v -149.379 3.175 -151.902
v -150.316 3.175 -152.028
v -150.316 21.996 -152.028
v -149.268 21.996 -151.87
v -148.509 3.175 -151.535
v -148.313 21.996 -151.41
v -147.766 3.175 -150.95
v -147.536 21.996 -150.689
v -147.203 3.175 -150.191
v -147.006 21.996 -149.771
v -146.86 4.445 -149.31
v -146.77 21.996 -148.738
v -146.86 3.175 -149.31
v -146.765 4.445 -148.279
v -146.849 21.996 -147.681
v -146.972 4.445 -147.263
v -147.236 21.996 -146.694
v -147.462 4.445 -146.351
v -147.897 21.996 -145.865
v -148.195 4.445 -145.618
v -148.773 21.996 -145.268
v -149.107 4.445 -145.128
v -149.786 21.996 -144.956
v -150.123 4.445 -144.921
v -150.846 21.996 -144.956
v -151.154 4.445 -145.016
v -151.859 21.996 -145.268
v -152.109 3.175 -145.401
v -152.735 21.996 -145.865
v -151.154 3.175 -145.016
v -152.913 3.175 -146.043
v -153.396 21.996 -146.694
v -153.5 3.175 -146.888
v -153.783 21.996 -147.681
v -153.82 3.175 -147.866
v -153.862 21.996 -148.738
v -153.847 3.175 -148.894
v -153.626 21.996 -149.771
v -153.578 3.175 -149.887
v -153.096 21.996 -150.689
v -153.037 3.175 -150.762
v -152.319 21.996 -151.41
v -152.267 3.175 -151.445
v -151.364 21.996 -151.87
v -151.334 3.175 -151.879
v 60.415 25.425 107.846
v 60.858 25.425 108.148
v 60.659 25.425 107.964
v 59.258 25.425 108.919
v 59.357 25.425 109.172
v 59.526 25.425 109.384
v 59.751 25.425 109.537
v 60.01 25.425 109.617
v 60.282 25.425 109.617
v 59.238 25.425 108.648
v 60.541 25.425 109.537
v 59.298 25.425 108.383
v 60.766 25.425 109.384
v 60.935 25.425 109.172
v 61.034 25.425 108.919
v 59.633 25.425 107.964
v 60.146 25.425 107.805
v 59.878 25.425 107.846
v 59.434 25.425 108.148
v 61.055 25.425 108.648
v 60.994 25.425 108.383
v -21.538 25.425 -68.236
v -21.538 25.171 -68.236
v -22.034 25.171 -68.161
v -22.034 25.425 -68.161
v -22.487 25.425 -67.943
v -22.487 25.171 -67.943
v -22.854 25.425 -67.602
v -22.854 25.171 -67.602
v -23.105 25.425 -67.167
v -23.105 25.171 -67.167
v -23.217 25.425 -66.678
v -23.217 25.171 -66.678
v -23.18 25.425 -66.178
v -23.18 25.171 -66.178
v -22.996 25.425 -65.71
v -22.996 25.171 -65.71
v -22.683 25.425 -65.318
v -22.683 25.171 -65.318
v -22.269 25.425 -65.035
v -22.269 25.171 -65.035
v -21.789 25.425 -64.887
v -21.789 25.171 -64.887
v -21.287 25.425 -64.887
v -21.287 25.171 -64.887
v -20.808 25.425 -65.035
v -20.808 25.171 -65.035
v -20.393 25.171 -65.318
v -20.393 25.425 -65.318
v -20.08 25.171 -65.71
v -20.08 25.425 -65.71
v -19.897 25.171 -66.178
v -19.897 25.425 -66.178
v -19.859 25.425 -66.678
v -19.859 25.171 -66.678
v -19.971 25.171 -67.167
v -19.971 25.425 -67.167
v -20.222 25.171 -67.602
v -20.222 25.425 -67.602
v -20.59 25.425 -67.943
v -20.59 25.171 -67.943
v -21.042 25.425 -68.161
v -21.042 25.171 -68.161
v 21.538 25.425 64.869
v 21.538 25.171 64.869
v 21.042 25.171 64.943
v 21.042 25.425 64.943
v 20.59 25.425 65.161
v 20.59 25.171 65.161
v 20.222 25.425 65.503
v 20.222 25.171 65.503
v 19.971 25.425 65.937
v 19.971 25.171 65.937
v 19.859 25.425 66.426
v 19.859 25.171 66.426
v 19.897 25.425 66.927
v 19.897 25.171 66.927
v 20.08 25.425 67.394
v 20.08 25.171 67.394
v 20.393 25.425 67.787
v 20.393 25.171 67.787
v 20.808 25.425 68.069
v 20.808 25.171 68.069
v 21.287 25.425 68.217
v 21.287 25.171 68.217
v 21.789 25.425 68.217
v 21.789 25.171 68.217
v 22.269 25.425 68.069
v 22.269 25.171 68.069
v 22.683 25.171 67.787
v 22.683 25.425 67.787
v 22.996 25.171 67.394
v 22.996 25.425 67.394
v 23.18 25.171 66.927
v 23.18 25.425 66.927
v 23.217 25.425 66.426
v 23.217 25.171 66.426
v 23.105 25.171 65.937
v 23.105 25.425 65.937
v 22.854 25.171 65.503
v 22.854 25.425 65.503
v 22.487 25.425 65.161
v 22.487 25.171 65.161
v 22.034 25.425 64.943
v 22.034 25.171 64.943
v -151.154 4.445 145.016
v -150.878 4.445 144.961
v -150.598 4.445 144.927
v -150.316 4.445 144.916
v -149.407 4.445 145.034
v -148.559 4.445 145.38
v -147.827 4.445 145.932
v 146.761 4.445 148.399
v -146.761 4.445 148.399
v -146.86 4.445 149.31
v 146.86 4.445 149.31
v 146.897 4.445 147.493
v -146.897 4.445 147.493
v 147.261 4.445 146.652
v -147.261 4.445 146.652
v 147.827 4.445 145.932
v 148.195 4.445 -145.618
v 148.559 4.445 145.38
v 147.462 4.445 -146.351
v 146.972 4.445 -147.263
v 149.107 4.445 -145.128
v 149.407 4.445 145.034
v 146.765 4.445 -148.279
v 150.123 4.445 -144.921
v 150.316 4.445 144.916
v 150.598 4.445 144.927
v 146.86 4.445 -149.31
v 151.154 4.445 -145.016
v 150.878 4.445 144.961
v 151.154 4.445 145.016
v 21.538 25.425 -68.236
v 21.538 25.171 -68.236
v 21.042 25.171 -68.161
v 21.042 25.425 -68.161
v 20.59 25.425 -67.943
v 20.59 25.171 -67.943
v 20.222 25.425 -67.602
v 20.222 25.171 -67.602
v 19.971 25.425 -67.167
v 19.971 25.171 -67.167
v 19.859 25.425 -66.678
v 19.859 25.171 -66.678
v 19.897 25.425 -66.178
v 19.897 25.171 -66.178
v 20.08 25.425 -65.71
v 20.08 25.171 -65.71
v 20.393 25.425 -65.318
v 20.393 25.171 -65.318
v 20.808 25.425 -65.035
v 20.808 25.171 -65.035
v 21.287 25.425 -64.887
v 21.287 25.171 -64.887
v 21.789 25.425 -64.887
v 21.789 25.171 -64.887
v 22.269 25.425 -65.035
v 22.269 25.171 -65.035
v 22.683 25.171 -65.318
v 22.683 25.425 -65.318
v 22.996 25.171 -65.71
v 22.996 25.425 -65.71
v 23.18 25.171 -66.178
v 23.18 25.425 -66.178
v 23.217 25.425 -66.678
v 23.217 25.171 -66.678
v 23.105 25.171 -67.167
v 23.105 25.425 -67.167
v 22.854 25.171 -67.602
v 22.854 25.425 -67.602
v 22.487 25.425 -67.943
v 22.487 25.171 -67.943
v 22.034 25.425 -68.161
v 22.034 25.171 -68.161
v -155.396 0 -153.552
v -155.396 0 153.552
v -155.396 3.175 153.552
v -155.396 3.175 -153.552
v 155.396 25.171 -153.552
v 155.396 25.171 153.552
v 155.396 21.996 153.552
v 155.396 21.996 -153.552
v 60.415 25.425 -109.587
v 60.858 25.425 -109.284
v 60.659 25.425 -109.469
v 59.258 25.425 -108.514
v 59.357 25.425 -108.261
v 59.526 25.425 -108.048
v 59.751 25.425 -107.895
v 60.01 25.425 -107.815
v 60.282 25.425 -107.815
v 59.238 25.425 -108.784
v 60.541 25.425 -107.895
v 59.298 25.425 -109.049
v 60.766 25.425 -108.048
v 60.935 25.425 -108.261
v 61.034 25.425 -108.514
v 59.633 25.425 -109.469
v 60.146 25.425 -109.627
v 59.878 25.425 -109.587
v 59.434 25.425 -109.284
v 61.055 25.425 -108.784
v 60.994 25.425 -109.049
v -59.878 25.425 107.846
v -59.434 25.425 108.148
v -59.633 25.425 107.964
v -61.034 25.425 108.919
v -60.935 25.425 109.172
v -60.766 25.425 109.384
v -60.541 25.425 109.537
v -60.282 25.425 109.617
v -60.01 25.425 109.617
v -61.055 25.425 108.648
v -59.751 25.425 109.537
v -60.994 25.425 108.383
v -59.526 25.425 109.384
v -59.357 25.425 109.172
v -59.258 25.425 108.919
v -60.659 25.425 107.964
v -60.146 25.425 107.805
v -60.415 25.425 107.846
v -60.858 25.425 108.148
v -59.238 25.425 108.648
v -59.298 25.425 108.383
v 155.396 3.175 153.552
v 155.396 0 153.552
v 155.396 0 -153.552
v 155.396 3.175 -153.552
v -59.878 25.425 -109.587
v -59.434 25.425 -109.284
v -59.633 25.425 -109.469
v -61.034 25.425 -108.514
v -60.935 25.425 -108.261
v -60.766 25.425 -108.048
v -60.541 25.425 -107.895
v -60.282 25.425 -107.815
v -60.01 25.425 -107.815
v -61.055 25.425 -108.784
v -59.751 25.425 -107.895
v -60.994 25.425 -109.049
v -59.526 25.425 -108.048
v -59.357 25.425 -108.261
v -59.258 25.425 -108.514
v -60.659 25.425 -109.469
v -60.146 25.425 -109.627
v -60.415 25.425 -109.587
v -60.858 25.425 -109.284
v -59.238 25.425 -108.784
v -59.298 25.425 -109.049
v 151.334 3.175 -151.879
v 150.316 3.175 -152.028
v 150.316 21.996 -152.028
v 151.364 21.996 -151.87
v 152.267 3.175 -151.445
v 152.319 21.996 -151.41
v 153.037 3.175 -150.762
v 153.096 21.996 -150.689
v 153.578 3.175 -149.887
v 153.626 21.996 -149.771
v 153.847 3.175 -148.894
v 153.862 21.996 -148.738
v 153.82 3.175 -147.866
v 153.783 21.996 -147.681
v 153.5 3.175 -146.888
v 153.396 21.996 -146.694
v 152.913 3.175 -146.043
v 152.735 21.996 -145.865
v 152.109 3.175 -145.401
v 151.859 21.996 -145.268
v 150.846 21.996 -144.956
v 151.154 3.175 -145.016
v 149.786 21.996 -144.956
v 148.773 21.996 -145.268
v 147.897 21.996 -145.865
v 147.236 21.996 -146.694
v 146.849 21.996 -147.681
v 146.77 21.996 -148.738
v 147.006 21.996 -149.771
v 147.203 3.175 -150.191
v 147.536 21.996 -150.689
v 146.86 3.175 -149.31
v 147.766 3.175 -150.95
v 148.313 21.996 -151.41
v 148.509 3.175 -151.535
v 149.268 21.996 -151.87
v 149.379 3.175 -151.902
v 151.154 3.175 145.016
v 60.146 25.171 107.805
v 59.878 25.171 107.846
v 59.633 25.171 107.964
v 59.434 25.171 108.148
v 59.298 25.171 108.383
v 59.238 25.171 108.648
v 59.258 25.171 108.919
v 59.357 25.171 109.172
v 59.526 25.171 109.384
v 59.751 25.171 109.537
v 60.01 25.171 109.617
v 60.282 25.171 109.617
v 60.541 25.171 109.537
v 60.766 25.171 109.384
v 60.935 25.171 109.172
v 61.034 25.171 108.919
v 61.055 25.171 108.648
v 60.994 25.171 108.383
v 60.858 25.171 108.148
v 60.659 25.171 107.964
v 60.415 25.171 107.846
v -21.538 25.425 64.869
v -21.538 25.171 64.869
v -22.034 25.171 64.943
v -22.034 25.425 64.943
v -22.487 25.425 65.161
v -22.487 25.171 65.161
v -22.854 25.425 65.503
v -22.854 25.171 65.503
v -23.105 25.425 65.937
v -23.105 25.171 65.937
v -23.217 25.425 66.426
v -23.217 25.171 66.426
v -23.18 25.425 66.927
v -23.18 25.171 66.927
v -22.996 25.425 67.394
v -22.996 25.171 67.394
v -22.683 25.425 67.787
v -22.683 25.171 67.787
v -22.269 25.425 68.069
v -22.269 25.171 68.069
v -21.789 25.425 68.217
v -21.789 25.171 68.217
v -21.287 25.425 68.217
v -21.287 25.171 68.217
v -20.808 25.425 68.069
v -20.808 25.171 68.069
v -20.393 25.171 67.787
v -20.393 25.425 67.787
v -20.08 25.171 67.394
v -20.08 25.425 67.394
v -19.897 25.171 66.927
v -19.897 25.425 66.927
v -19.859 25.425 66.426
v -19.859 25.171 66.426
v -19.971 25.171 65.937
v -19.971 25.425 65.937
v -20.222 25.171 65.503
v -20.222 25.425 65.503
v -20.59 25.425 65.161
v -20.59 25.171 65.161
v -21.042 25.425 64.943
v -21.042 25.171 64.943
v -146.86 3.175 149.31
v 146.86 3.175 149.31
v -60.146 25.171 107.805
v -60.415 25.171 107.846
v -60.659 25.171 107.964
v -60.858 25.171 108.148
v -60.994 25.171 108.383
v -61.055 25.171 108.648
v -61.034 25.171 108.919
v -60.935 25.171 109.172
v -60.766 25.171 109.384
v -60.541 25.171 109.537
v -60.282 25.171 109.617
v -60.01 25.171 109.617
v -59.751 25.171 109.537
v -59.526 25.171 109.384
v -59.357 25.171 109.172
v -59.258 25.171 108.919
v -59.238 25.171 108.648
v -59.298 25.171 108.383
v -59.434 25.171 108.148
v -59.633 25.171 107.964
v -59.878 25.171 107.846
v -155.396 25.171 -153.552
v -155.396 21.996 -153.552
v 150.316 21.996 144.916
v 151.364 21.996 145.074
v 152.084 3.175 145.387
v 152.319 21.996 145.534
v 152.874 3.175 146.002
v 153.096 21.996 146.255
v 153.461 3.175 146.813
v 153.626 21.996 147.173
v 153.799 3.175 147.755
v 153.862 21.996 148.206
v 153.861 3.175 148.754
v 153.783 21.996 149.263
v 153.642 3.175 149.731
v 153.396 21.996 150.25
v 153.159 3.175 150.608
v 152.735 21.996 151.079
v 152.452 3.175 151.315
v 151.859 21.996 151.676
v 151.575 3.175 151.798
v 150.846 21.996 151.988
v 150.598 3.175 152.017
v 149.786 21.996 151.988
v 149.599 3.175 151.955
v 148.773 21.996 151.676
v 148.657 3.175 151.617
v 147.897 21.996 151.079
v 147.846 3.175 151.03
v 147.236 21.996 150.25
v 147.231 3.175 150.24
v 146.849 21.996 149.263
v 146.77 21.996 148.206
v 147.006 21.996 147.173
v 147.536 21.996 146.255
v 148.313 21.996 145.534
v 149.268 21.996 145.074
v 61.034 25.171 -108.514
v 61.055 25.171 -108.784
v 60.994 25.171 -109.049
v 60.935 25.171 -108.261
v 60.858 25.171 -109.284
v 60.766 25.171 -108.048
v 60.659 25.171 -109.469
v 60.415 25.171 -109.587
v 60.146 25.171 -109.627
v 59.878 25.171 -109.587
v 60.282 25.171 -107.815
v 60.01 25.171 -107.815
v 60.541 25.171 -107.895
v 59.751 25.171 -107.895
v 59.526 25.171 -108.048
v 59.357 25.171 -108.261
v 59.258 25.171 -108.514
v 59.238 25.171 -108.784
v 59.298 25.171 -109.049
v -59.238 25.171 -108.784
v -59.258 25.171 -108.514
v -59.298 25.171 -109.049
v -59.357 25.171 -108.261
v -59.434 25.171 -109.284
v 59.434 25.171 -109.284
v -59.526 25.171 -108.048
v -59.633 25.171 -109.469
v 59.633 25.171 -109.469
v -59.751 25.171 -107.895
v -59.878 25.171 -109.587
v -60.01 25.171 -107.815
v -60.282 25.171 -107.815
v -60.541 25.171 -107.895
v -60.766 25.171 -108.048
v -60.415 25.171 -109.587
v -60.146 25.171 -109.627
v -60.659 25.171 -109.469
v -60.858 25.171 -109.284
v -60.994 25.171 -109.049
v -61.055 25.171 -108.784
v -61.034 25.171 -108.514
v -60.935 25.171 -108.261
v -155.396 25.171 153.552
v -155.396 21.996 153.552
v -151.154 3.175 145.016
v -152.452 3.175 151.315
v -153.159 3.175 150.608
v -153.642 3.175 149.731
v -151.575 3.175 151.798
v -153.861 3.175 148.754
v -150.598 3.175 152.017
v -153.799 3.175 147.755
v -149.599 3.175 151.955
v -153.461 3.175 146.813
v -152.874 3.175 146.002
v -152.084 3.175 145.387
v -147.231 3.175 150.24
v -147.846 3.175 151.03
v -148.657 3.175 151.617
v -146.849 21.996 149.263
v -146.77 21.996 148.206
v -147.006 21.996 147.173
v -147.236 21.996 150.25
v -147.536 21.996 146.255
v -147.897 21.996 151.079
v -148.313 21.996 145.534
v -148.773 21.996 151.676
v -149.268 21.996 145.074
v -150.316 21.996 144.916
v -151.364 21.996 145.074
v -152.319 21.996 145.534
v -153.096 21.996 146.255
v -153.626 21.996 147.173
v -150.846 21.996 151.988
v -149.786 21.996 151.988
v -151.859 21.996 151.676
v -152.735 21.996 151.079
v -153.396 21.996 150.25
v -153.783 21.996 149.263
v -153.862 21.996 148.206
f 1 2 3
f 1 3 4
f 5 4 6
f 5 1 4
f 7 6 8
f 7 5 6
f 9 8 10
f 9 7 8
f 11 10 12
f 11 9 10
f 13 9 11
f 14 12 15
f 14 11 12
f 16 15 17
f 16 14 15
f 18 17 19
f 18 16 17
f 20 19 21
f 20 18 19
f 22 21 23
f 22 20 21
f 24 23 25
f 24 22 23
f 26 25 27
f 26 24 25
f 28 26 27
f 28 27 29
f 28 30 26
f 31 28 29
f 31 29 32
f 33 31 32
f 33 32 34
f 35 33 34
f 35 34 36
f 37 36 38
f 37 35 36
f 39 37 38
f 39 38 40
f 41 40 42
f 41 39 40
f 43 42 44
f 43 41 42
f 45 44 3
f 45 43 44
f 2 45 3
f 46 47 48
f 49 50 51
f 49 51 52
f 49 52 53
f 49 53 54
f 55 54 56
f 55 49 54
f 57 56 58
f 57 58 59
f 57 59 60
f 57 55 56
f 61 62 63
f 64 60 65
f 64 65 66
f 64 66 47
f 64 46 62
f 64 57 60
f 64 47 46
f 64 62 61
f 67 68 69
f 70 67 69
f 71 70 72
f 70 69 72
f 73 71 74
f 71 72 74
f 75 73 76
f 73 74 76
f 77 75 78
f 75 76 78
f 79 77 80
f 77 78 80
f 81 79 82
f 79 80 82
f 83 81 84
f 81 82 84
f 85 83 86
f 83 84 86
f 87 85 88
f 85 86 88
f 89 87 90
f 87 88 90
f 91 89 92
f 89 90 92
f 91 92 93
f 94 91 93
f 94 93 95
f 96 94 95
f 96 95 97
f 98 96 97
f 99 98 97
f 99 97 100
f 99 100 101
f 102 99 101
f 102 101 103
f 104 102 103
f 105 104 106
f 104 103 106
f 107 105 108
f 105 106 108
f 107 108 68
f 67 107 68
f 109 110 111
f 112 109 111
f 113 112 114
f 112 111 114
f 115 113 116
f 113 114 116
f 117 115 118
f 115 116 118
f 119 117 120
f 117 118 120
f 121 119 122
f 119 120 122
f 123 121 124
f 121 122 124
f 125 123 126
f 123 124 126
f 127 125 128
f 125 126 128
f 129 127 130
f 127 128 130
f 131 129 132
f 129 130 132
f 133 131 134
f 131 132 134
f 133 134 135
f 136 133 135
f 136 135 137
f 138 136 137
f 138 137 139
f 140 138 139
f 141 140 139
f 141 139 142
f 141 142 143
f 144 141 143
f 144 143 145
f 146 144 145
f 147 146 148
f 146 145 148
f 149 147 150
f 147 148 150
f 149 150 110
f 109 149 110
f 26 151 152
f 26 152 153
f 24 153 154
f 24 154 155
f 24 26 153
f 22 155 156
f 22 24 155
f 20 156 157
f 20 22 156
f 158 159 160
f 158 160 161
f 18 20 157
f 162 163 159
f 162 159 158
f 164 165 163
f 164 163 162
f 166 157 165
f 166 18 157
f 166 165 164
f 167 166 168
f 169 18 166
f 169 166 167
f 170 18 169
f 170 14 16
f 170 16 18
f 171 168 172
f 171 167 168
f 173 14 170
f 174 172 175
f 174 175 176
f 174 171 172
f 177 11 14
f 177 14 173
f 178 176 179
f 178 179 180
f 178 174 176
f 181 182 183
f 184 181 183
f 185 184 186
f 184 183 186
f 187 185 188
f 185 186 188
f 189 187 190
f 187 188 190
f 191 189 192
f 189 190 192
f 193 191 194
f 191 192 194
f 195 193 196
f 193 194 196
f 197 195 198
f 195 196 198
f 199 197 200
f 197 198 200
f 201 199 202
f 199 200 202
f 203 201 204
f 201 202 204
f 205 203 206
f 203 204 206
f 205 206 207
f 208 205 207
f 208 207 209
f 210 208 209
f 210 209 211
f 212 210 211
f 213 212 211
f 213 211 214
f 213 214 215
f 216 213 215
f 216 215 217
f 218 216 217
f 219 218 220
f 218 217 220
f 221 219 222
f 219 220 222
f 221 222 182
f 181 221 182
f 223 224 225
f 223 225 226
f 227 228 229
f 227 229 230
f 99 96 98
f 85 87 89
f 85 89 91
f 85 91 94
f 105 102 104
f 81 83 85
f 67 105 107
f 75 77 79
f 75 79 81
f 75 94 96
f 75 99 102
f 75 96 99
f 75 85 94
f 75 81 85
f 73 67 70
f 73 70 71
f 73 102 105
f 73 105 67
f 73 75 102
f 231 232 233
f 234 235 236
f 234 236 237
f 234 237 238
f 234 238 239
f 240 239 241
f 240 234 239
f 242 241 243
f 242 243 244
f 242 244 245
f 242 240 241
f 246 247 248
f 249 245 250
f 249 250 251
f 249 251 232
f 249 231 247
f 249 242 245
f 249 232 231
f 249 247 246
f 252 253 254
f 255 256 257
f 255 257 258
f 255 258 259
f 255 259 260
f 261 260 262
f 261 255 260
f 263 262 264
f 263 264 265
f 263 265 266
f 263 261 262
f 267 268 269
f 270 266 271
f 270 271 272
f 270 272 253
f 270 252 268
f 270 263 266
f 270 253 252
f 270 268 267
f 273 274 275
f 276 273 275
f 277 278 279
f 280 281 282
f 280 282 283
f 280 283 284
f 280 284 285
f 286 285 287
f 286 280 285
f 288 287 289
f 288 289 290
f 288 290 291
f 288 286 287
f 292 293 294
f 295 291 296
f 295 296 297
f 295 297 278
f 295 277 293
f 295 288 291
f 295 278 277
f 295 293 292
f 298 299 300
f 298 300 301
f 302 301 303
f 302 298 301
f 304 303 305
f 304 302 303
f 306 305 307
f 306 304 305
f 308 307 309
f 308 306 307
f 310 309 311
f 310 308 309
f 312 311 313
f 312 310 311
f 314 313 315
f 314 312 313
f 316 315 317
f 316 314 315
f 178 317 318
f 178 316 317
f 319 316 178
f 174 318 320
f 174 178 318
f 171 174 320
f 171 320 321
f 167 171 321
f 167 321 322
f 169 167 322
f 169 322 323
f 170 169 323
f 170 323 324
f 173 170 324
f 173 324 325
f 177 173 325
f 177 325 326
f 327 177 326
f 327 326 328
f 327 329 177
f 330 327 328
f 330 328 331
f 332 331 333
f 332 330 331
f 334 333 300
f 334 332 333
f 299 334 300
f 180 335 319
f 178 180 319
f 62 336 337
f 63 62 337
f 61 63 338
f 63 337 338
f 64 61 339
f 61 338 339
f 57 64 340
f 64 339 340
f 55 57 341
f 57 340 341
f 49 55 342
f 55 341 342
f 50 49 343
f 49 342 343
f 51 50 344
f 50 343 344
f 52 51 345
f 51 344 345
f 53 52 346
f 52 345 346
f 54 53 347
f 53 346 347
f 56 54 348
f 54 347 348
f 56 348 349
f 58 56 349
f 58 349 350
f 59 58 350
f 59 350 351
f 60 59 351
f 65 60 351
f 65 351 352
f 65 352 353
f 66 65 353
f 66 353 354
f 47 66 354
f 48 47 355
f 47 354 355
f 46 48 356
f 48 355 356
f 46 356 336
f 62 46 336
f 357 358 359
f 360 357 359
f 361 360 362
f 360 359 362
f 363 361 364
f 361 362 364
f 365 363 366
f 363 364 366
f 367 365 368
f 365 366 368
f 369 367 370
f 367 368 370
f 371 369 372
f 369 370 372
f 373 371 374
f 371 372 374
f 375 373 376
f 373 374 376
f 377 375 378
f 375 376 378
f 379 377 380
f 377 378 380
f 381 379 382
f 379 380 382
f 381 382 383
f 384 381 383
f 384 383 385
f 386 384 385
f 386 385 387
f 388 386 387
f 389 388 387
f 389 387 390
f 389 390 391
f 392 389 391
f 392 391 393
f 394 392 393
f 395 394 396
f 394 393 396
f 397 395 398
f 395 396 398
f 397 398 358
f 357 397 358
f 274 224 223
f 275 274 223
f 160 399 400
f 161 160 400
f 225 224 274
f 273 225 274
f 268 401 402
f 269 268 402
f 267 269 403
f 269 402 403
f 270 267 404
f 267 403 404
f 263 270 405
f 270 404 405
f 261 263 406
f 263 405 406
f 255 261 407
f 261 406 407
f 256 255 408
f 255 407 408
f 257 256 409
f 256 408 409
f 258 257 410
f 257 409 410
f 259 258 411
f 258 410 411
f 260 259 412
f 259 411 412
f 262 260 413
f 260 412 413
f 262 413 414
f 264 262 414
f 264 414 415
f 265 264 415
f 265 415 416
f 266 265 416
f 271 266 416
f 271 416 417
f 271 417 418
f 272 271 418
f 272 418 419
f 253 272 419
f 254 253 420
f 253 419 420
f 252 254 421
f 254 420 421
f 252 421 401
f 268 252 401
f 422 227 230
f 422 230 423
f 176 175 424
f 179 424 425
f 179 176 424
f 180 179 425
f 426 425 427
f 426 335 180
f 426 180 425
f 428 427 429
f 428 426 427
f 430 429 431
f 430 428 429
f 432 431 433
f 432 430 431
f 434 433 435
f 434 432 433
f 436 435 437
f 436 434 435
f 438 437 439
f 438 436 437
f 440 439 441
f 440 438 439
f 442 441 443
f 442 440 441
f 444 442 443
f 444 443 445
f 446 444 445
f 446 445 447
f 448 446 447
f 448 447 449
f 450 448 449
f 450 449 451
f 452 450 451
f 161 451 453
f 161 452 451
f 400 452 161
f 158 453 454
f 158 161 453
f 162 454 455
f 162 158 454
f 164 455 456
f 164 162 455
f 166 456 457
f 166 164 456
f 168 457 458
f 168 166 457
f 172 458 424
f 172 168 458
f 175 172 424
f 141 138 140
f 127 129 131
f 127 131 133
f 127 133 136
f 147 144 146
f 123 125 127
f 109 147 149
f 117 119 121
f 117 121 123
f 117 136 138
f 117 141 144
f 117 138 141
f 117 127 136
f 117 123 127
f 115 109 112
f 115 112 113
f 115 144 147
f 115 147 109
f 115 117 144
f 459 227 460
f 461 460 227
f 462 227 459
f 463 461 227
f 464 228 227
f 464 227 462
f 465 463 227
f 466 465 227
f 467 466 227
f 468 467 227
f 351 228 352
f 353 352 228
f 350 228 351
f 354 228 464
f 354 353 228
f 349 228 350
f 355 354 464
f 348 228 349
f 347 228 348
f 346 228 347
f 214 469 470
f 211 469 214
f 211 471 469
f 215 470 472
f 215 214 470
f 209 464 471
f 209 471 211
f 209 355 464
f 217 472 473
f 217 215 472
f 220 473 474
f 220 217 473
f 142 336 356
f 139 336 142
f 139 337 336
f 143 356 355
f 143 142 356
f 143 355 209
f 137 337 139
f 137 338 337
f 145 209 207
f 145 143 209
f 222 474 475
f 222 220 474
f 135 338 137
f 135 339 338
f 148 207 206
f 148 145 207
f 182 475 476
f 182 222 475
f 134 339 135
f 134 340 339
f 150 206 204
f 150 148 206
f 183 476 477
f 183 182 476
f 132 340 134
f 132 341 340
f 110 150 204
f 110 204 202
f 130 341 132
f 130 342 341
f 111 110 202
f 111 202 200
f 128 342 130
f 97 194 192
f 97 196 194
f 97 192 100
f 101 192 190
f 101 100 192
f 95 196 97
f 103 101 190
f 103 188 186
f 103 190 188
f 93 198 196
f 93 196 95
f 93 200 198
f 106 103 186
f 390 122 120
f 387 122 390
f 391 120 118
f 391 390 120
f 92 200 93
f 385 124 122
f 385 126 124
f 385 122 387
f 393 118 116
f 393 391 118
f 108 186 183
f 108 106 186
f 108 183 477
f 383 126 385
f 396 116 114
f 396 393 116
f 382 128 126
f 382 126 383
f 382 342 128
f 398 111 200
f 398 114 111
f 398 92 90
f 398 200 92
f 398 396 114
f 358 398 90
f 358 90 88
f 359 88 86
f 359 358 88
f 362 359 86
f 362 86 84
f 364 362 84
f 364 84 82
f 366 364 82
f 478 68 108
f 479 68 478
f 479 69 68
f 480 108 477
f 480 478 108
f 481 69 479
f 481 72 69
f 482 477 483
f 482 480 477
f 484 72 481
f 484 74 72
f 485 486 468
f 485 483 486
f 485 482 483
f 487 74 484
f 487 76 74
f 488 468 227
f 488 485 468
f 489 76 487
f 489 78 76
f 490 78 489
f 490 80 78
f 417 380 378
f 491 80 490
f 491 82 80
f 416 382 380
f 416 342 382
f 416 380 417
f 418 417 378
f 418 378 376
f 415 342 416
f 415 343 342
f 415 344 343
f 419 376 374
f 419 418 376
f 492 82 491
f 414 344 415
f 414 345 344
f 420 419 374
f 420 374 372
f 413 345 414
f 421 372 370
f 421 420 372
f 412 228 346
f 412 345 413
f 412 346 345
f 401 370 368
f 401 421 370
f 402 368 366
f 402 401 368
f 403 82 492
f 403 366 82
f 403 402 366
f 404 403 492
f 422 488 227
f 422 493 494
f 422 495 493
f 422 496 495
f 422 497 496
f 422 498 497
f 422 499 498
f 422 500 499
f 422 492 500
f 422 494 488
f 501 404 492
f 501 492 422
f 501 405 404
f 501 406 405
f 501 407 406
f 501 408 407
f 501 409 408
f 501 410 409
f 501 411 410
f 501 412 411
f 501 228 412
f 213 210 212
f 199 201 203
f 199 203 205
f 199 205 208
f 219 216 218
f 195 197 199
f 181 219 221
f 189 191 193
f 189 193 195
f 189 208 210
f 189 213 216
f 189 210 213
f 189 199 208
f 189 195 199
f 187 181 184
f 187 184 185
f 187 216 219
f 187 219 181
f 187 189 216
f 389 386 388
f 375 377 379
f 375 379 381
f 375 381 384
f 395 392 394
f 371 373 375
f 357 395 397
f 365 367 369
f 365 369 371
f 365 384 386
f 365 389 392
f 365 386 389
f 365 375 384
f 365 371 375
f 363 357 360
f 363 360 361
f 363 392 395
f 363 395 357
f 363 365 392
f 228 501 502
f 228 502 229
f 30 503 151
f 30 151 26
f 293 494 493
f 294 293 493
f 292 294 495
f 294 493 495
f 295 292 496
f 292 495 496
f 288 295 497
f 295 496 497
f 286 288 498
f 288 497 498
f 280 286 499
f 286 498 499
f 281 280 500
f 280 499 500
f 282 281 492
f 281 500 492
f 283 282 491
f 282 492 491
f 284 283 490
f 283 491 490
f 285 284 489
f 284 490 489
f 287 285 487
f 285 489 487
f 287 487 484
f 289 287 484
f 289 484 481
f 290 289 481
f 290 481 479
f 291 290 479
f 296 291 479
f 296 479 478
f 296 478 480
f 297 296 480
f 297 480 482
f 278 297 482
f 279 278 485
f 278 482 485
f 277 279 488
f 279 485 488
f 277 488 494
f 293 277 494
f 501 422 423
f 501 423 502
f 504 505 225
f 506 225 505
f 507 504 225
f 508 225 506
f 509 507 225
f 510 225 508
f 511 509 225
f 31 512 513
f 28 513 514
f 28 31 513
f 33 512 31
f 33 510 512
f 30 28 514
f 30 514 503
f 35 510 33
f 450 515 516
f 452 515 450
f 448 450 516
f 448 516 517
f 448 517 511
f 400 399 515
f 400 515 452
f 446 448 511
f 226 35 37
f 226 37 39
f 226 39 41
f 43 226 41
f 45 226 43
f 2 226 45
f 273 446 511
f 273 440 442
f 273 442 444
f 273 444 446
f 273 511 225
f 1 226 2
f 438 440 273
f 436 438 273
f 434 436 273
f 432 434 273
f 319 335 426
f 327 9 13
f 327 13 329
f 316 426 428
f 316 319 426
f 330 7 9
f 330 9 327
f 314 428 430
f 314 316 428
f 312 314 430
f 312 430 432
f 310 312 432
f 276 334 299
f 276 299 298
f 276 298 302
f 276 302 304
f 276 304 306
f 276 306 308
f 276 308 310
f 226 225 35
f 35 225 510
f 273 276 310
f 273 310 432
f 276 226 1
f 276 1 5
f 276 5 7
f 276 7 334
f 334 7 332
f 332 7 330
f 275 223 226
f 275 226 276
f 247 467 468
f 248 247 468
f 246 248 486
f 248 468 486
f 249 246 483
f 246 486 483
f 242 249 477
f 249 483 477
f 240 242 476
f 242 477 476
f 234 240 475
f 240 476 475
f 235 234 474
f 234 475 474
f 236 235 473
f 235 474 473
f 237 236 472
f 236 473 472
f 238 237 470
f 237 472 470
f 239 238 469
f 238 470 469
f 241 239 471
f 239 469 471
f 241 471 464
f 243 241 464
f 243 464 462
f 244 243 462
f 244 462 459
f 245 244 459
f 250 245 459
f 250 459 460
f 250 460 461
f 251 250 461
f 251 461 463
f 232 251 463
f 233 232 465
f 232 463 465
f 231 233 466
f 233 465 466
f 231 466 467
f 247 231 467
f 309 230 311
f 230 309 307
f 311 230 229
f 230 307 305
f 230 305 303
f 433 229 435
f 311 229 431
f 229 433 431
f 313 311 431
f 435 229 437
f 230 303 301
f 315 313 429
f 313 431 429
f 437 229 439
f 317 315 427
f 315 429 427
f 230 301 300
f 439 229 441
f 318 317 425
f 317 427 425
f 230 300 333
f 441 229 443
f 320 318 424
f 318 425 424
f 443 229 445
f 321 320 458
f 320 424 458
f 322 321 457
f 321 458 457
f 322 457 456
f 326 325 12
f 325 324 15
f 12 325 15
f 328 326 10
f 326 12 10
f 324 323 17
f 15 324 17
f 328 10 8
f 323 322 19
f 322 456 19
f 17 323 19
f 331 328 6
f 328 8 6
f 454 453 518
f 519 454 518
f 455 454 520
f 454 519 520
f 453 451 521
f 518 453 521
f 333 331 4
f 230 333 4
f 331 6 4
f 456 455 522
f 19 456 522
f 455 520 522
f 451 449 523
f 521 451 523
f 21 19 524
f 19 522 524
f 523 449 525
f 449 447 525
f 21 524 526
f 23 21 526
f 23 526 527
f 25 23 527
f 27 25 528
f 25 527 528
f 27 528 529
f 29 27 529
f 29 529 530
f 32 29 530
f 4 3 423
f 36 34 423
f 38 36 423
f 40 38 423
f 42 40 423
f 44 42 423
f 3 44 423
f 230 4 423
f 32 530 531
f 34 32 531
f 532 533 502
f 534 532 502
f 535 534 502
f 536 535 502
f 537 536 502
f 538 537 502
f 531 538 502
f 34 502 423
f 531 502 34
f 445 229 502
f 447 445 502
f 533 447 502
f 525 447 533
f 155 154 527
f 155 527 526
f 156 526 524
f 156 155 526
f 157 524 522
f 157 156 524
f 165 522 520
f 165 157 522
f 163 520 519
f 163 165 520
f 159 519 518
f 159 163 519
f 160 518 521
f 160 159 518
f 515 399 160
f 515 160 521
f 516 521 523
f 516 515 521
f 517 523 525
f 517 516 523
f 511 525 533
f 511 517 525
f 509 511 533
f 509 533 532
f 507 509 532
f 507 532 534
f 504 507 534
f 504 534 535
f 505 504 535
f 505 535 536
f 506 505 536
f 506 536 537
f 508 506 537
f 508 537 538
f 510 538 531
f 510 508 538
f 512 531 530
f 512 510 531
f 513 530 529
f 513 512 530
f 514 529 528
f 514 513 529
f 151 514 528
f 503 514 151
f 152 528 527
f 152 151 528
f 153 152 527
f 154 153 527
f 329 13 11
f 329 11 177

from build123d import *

# Parameters (mm, degrees)
SKETCH1_W           = 310.792155558
SKETCH1_H           = 307.10414309
BOSS_EXTRUDE1_DEPTH = 3.175
SKETCH2_W           = 302.308555558
SKETCH2_H           = 298.62054309
BOSS_EXTRUDE2_DEPTH = 1.27
BOSS_EXTRUDE4_DEPTH = 3.175
SKETCH6_R           = 0.911045746
SKETCH6_R_2         = 1.683740392
BOSS_EXTRUDE7_DEPTH = 0.254
SKETCH7_R           = 3.556
BOSS_EXTRUDE8_DEPTH = 23.876


with BuildPart() as part:
    # Sketch1 → Boss-Extrude1 (new body)
    with BuildSketch(Plane(origin=(0, 0, 0), x_dir=(1, 0, 0), z_dir=(0, 1, 0))):
        Rectangle(SKETCH1_W, SKETCH1_H)
    extrude(amount=BOSS_EXTRUDE1_DEPTH)

    # Sketch2 → Boss-Extrude2 (add)
    with BuildSketch(Plane(origin=(0, 3.175, 0), x_dir=(1, 0, 0), z_dir=(0, 1, 0))):
        Rectangle(SKETCH2_W, SKETCH2_H)
    extrude(amount=BOSS_EXTRUDE2_DEPTH)



with BuildPart() as body_2:
    # 3DSketch1 → Boss-Extrude4 (new body)
    with BuildSketch(Plane(origin=(-155.396077779, 25.1714, -153.552071545), x_dir=(0.7113145904869971, 0, 0.7028737819554204), z_dir=(0, -1, 0))):
        Polygon((0, 0), (215.855450508, 218.447657779), (436.926445365, 0), (221.070994857, -218.447657779), align=None)
    extrude(amount=BOSS_EXTRUDE4_DEPTH)

    # Sketch6 → Boss-Extrude7 (add)
    with BuildSketch(Plane(origin=(0, 25.1714, 0), x_dir=(1, 0, 0), z_dir=(0, 1, 0))):
        with Locations(Location((-60.146077779, -108.71629912, 0), (0, 0, 90))):
            Circle(SKETCH6_R)
        with Locations(Location((-21.538077779, -66.55229912, 0), (0, 0, 90))):
            Circle(SKETCH6_R_2)
        with Locations(Location((-60.146077779, 108.71629912, 0), (0, 0, 90))):
            Circle(SKETCH6_R)
        with Locations(Location((-21.538077779, 66.55229912, 0), (0, 0, 90))):
            Circle(SKETCH6_R_2)
        with Locations(Location((21.538077779, 66.55229912, 0), (0, 0, 90))):
            Circle(SKETCH6_R_2)
        with Locations(Location((60.146077779, 108.71629912, 0), (0, 0, 90))):
            Circle(SKETCH6_R)
        with Locations(Location((21.538077779, -66.55229912, 0), (0, 0, 90))):
            Circle(SKETCH6_R_2)
        with Locations(Location((60.146077779, -108.71629912, 0), (0, 0, 90))):
            Circle(SKETCH6_R)
    extrude(amount=BOSS_EXTRUDE7_DEPTH)


with BuildPart() as part_1:
    add(part.part)

    add(body_2.part)  # Boss-Extrude8 merges body 2
    # Sketch7 → Boss-Extrude8 (add)
    with BuildSketch(Plane.XZ):
        with Locations(Location((-150.316077779, 148.472071545, 0), (0, 0, 270))):
            Circle(SKETCH7_R)
        with Locations(Location((150.316077779, 148.472071545, 0), (0, 0, 270))):
            Circle(SKETCH7_R)
        with Locations(Location((150.316077779, -148.472071545, 0), (0, 0, 270))):
            Circle(SKETCH7_R)
        with Locations(Location((-150.316077779, -148.472071545, 0), (0, 0, 270))):
            Circle(SKETCH7_R)
    extrude(amount=-BOSS_EXTRUDE8_DEPTH)


solid = part_1.part
